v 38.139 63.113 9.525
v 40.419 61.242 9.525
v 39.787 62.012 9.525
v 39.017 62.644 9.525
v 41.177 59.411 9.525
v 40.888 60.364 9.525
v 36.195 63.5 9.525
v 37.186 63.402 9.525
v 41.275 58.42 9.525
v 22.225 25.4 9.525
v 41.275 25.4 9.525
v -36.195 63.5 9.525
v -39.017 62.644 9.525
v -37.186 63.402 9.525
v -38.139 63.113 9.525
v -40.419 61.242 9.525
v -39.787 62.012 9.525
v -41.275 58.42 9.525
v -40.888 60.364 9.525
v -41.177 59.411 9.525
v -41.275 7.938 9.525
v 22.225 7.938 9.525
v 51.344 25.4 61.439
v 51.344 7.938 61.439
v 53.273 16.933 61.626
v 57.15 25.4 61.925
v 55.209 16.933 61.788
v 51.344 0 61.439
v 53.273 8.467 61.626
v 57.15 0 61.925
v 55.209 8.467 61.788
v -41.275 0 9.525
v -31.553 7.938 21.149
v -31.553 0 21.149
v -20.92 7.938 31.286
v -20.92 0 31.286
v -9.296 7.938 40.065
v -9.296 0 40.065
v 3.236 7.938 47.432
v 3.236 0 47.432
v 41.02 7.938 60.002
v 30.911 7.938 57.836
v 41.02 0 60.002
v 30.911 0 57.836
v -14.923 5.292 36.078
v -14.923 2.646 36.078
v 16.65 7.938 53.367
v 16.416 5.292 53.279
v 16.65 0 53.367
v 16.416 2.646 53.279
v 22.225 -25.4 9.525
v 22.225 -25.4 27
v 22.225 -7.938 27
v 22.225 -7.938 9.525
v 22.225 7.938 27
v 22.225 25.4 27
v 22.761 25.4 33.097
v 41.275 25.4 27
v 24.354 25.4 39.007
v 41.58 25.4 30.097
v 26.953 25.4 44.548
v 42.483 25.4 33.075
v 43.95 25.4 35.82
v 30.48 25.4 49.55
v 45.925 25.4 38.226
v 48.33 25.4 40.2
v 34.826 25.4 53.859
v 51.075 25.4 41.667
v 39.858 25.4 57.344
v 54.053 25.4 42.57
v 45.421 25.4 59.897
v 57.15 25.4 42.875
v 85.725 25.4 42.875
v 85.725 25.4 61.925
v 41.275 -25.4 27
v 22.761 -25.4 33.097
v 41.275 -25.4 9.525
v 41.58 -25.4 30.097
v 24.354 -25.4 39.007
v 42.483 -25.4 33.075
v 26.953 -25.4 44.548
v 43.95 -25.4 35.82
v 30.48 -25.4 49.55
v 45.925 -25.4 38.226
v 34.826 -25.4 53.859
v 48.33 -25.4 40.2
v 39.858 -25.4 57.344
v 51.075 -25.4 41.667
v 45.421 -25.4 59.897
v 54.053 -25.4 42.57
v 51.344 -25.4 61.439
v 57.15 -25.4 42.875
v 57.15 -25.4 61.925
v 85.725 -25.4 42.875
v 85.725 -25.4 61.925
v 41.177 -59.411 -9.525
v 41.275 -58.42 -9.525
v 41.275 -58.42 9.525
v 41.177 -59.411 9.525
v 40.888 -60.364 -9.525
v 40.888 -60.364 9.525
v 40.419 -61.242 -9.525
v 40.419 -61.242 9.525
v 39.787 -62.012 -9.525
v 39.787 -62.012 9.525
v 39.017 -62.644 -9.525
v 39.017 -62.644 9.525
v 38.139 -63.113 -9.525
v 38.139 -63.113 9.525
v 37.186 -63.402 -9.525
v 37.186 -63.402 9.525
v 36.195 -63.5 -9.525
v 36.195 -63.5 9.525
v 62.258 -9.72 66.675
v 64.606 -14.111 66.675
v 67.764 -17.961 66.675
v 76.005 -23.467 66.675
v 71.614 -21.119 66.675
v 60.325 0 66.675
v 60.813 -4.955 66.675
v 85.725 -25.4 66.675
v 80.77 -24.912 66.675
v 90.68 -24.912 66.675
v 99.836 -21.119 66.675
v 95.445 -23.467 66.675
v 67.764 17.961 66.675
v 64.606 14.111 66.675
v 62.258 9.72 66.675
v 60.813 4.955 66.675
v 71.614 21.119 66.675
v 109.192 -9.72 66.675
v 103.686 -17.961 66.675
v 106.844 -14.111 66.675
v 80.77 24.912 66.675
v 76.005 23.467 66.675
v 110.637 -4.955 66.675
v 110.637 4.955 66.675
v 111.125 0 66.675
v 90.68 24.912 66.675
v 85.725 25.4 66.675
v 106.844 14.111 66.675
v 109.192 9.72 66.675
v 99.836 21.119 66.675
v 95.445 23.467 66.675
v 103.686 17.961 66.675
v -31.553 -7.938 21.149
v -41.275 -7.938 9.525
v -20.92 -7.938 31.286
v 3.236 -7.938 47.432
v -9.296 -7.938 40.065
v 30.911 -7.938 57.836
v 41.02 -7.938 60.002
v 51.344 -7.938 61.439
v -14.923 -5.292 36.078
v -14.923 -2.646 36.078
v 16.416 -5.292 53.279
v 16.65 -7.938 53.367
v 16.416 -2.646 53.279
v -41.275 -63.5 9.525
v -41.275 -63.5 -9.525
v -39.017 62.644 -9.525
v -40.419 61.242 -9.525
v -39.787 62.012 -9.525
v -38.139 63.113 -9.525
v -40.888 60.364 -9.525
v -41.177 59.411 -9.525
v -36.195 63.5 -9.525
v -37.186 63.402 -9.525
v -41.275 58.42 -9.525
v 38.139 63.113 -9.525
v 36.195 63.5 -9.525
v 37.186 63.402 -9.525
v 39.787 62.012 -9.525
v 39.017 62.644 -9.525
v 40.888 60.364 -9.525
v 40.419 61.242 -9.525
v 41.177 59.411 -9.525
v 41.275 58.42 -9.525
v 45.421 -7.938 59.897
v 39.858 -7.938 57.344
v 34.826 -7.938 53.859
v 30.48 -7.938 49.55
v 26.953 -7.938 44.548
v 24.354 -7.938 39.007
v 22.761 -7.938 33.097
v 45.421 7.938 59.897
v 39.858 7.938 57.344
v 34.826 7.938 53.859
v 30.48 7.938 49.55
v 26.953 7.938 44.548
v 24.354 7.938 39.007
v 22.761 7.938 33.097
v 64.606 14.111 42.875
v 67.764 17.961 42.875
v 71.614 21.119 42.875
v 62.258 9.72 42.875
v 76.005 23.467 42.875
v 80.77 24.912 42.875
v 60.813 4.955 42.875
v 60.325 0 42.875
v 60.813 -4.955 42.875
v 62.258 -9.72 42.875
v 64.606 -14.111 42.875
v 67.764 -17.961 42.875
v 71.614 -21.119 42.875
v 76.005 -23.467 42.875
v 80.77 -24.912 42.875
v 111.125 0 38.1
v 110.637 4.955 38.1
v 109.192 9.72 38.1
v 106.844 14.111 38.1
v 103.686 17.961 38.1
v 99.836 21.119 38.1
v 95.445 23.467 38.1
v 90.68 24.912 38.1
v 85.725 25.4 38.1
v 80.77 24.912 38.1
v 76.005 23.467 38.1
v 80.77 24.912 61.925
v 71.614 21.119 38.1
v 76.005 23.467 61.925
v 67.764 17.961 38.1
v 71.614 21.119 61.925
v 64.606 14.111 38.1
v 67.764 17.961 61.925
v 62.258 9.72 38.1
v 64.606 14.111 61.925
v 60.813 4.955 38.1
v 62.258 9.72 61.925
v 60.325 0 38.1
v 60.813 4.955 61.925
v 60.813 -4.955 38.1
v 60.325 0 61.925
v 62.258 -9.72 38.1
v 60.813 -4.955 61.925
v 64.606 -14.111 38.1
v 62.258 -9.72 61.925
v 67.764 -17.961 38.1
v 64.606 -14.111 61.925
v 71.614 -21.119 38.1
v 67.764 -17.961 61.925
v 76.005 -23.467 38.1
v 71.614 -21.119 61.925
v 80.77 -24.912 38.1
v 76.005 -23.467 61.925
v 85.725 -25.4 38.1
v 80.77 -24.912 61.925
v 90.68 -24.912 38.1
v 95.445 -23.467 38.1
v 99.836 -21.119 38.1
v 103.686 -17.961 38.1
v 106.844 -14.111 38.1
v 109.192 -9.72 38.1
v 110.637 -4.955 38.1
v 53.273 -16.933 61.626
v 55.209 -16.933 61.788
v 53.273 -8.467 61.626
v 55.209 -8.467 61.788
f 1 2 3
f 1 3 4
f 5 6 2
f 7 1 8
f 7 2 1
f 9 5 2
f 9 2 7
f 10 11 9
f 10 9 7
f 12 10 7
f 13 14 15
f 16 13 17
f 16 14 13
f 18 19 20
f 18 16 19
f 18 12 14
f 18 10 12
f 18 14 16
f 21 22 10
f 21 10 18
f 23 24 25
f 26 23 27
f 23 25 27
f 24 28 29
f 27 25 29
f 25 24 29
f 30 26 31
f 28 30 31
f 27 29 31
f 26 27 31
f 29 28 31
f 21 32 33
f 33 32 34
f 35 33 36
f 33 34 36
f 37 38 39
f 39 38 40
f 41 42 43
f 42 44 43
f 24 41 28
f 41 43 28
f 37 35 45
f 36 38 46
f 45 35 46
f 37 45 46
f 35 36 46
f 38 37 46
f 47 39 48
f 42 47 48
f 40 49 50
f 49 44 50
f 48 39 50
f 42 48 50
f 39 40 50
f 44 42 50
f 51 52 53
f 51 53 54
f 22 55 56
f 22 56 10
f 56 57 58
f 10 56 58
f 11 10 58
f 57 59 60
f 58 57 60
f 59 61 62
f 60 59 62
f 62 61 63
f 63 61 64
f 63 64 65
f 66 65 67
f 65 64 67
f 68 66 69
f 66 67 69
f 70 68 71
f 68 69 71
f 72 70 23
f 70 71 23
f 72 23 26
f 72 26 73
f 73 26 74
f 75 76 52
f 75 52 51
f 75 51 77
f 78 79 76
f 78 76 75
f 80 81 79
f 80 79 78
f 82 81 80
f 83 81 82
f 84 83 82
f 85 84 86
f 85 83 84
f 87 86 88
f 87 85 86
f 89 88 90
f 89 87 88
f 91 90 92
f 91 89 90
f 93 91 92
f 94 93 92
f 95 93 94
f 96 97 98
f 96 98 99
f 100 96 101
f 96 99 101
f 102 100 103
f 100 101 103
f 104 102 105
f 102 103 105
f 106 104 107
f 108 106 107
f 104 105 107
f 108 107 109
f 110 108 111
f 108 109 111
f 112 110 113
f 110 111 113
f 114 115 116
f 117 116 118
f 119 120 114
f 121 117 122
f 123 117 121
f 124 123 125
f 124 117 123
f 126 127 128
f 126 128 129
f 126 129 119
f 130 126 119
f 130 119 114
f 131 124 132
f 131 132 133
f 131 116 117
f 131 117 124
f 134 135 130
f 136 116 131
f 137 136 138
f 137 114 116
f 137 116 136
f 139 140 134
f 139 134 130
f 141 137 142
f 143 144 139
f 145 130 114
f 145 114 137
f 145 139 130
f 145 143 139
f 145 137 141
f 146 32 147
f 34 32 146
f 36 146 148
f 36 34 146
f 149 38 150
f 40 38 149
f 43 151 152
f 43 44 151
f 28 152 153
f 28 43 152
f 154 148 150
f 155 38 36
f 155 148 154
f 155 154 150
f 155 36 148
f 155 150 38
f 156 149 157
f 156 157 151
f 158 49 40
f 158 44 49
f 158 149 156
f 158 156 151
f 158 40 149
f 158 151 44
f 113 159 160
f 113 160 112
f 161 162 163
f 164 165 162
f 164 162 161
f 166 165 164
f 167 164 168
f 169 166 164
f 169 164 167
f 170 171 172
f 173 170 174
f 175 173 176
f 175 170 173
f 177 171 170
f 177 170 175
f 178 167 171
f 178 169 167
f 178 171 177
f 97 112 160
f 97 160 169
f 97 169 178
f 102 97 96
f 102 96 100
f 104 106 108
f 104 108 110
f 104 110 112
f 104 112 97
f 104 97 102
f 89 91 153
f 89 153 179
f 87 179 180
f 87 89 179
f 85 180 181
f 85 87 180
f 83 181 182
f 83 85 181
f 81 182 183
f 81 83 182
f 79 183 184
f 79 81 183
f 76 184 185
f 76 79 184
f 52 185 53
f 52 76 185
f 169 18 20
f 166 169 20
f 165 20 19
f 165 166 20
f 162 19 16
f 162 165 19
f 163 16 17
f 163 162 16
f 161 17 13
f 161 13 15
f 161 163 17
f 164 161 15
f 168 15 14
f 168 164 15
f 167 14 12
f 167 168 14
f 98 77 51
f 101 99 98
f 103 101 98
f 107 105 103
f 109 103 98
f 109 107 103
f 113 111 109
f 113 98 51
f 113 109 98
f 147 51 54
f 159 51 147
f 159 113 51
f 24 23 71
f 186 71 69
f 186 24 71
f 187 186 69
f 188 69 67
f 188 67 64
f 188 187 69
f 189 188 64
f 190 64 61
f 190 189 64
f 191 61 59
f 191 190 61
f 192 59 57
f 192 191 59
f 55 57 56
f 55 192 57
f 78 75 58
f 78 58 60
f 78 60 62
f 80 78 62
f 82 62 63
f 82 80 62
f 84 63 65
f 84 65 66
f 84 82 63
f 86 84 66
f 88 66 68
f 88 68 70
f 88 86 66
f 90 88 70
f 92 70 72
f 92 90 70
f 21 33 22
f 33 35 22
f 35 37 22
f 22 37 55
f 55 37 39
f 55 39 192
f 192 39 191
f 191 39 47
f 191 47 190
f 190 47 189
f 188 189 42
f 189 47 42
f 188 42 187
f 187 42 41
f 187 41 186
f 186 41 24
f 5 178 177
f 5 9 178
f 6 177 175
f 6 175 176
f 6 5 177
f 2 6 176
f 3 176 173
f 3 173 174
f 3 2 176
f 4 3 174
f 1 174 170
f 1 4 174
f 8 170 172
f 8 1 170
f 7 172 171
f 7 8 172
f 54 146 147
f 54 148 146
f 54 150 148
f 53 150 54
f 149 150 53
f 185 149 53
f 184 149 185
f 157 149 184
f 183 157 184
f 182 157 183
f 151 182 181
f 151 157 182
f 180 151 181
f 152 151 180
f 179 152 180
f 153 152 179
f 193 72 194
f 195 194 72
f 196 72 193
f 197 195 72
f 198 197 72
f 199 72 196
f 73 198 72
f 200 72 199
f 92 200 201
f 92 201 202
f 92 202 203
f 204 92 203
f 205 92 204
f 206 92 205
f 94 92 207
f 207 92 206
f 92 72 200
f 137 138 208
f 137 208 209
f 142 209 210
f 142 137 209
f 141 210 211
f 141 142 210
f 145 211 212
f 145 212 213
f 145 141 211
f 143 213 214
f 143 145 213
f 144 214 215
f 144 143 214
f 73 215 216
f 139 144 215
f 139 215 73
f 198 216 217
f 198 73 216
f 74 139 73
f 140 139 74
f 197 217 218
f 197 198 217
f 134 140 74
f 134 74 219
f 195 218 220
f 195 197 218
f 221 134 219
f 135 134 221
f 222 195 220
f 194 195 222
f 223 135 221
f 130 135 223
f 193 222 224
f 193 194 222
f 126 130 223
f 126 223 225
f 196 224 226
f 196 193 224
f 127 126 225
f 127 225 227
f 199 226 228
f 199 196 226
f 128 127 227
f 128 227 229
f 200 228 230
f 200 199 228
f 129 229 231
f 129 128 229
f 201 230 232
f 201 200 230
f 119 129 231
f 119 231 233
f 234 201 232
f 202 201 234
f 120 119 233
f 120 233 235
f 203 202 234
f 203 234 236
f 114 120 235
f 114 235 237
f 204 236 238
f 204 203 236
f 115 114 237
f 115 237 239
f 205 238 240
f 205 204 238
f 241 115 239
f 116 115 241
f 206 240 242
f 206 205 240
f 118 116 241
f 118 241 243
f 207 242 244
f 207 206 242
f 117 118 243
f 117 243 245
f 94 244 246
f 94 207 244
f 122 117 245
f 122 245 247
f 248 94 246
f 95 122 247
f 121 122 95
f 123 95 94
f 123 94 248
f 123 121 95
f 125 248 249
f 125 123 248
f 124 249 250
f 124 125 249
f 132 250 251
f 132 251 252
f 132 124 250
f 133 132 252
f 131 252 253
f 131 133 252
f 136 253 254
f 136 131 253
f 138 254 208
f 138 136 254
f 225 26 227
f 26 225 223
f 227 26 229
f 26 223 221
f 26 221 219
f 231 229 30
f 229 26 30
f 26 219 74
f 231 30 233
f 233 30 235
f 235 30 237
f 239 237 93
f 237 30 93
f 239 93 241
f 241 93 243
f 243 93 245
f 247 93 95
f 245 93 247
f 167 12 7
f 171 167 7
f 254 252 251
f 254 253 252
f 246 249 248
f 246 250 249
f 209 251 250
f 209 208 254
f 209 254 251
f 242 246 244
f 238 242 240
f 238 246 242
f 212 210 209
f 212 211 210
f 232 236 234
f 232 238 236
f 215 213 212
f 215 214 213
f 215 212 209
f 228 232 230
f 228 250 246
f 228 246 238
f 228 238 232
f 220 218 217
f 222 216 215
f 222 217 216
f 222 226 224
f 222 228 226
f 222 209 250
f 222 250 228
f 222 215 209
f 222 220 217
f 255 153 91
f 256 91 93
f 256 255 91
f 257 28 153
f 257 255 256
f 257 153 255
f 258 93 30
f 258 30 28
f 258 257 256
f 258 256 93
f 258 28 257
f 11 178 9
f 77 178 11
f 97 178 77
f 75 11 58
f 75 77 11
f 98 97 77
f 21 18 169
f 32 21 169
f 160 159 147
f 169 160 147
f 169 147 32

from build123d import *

# Parameters (mm, degrees)
F1_DEPTH = 63.5
F2_DEPTH = 25.4
F0_W     = 25.4
F0_H     = 19.05
F3_DEPTH = 25.4
F4_DEPTH = 7.9375
F6_R     = 5.08


with BuildPart() as f1:
    # F0 (on Front) → F1 (new body, symmetric)
    with BuildSketch(Plane.XZ):
        Polygon((41.275, -9.525), (41.275, 9.525), (22.225, 9.525), (-41.275, 9.525), (-41.275, -9.525), align=None)
    extrude(amount=F1_DEPTH, both=True)

    # F0 (on Front) → F2 (join, symmetric)
    with BuildSketch(Plane.XZ):
        with BuildLine():
            Line((22.225, 9.525), (41.275, 9.525))
            Line((41.275, 9.525), (41.275, 27.0002))
            ThreePointArc((41.275, 27.0002), (45.9246798487, 38.2255201513), (57.15, 42.8752))
            Line((57.15, 42.8752), (60.325, 42.8752))
            Line((60.325, 42.8752), (60.325, 61.9252))
            Line((60.325, 61.9252), (57.15, 61.9252))
            add(Edge.make_bspline(
                [(51.3437067014, 61.4391689615), (53.2701840595, 61.6380826353), (55.2059301459, 61.8000229845), (57.15, 61.9252)],
                knots=[105.8784898715, 105.8784898715, 105.8784898715, 105.8784898715, 111.5045361635, 111.5045361635, 111.5045361635, 111.5045361635], degree=3))
            ThreePointArc((51.3437067014, 61.4391689615), (30.4803504105, 49.5498211891), (22.225, 27.0002))
            Line((22.225, 27.0002), (22.225, 9.525))
        make_face()
    extrude(amount=F2_DEPTH, both=True)

    # F0 (on Front) → F3 (join, symmetric)
    with BuildSketch(Plane.XZ):
        with Locations((73.025, 52.4002)):
            Rectangle(F0_W, F0_H)
    extrude(amount=F3_DEPTH, both=True)

    # F0 (on Front) → F4 (join, symmetric)
    with BuildSketch(Plane.XZ):
        with BuildLine():
            Line((-41.275, 9.525), (22.225, 9.525))
            Line((22.225, 9.525), (22.225, 27.0002))
            ThreePointArc((22.225, 27.0002), (30.4803504105, 49.5498211891), (51.3437067014, 61.4391689615))
            add(Edge.make_bspline(
                [(-41.275, 9.525), (-17.8836826393, 40.8575650231), (15.0886702409, 57.6957444853), (51.3437067014, 61.4391689615)],
                knots=[0, 0, 0, 0, 105.8784898715, 105.8784898715, 105.8784898715, 105.8784898715], degree=3))
        make_face()
    extrude(amount=F4_DEPTH, both=True)

    # F0 (on Front) → F5 (revolve)
    with BuildSketch(Plane.XZ):
        Polygon((85.725, 61.9252), (85.725, 42.8752), (85.725, 38.1), (111.125, 38.1), (111.125, 66.675), (85.725, 66.675), align=None)
    revolve(axis=Axis((85.725, 0, 52.3875), (0, 0, 1)))

    # F6
    f6_edges = [f1.edges().sort_by_distance(p)[0] for p in [
        (41.275, -63.5, 0),
        (-41.275, 63.5, 0),
        (41.275, 63.5, 0),
    ]]
    fillet(f6_edges, radius=F6_R)


solid = f1.part
